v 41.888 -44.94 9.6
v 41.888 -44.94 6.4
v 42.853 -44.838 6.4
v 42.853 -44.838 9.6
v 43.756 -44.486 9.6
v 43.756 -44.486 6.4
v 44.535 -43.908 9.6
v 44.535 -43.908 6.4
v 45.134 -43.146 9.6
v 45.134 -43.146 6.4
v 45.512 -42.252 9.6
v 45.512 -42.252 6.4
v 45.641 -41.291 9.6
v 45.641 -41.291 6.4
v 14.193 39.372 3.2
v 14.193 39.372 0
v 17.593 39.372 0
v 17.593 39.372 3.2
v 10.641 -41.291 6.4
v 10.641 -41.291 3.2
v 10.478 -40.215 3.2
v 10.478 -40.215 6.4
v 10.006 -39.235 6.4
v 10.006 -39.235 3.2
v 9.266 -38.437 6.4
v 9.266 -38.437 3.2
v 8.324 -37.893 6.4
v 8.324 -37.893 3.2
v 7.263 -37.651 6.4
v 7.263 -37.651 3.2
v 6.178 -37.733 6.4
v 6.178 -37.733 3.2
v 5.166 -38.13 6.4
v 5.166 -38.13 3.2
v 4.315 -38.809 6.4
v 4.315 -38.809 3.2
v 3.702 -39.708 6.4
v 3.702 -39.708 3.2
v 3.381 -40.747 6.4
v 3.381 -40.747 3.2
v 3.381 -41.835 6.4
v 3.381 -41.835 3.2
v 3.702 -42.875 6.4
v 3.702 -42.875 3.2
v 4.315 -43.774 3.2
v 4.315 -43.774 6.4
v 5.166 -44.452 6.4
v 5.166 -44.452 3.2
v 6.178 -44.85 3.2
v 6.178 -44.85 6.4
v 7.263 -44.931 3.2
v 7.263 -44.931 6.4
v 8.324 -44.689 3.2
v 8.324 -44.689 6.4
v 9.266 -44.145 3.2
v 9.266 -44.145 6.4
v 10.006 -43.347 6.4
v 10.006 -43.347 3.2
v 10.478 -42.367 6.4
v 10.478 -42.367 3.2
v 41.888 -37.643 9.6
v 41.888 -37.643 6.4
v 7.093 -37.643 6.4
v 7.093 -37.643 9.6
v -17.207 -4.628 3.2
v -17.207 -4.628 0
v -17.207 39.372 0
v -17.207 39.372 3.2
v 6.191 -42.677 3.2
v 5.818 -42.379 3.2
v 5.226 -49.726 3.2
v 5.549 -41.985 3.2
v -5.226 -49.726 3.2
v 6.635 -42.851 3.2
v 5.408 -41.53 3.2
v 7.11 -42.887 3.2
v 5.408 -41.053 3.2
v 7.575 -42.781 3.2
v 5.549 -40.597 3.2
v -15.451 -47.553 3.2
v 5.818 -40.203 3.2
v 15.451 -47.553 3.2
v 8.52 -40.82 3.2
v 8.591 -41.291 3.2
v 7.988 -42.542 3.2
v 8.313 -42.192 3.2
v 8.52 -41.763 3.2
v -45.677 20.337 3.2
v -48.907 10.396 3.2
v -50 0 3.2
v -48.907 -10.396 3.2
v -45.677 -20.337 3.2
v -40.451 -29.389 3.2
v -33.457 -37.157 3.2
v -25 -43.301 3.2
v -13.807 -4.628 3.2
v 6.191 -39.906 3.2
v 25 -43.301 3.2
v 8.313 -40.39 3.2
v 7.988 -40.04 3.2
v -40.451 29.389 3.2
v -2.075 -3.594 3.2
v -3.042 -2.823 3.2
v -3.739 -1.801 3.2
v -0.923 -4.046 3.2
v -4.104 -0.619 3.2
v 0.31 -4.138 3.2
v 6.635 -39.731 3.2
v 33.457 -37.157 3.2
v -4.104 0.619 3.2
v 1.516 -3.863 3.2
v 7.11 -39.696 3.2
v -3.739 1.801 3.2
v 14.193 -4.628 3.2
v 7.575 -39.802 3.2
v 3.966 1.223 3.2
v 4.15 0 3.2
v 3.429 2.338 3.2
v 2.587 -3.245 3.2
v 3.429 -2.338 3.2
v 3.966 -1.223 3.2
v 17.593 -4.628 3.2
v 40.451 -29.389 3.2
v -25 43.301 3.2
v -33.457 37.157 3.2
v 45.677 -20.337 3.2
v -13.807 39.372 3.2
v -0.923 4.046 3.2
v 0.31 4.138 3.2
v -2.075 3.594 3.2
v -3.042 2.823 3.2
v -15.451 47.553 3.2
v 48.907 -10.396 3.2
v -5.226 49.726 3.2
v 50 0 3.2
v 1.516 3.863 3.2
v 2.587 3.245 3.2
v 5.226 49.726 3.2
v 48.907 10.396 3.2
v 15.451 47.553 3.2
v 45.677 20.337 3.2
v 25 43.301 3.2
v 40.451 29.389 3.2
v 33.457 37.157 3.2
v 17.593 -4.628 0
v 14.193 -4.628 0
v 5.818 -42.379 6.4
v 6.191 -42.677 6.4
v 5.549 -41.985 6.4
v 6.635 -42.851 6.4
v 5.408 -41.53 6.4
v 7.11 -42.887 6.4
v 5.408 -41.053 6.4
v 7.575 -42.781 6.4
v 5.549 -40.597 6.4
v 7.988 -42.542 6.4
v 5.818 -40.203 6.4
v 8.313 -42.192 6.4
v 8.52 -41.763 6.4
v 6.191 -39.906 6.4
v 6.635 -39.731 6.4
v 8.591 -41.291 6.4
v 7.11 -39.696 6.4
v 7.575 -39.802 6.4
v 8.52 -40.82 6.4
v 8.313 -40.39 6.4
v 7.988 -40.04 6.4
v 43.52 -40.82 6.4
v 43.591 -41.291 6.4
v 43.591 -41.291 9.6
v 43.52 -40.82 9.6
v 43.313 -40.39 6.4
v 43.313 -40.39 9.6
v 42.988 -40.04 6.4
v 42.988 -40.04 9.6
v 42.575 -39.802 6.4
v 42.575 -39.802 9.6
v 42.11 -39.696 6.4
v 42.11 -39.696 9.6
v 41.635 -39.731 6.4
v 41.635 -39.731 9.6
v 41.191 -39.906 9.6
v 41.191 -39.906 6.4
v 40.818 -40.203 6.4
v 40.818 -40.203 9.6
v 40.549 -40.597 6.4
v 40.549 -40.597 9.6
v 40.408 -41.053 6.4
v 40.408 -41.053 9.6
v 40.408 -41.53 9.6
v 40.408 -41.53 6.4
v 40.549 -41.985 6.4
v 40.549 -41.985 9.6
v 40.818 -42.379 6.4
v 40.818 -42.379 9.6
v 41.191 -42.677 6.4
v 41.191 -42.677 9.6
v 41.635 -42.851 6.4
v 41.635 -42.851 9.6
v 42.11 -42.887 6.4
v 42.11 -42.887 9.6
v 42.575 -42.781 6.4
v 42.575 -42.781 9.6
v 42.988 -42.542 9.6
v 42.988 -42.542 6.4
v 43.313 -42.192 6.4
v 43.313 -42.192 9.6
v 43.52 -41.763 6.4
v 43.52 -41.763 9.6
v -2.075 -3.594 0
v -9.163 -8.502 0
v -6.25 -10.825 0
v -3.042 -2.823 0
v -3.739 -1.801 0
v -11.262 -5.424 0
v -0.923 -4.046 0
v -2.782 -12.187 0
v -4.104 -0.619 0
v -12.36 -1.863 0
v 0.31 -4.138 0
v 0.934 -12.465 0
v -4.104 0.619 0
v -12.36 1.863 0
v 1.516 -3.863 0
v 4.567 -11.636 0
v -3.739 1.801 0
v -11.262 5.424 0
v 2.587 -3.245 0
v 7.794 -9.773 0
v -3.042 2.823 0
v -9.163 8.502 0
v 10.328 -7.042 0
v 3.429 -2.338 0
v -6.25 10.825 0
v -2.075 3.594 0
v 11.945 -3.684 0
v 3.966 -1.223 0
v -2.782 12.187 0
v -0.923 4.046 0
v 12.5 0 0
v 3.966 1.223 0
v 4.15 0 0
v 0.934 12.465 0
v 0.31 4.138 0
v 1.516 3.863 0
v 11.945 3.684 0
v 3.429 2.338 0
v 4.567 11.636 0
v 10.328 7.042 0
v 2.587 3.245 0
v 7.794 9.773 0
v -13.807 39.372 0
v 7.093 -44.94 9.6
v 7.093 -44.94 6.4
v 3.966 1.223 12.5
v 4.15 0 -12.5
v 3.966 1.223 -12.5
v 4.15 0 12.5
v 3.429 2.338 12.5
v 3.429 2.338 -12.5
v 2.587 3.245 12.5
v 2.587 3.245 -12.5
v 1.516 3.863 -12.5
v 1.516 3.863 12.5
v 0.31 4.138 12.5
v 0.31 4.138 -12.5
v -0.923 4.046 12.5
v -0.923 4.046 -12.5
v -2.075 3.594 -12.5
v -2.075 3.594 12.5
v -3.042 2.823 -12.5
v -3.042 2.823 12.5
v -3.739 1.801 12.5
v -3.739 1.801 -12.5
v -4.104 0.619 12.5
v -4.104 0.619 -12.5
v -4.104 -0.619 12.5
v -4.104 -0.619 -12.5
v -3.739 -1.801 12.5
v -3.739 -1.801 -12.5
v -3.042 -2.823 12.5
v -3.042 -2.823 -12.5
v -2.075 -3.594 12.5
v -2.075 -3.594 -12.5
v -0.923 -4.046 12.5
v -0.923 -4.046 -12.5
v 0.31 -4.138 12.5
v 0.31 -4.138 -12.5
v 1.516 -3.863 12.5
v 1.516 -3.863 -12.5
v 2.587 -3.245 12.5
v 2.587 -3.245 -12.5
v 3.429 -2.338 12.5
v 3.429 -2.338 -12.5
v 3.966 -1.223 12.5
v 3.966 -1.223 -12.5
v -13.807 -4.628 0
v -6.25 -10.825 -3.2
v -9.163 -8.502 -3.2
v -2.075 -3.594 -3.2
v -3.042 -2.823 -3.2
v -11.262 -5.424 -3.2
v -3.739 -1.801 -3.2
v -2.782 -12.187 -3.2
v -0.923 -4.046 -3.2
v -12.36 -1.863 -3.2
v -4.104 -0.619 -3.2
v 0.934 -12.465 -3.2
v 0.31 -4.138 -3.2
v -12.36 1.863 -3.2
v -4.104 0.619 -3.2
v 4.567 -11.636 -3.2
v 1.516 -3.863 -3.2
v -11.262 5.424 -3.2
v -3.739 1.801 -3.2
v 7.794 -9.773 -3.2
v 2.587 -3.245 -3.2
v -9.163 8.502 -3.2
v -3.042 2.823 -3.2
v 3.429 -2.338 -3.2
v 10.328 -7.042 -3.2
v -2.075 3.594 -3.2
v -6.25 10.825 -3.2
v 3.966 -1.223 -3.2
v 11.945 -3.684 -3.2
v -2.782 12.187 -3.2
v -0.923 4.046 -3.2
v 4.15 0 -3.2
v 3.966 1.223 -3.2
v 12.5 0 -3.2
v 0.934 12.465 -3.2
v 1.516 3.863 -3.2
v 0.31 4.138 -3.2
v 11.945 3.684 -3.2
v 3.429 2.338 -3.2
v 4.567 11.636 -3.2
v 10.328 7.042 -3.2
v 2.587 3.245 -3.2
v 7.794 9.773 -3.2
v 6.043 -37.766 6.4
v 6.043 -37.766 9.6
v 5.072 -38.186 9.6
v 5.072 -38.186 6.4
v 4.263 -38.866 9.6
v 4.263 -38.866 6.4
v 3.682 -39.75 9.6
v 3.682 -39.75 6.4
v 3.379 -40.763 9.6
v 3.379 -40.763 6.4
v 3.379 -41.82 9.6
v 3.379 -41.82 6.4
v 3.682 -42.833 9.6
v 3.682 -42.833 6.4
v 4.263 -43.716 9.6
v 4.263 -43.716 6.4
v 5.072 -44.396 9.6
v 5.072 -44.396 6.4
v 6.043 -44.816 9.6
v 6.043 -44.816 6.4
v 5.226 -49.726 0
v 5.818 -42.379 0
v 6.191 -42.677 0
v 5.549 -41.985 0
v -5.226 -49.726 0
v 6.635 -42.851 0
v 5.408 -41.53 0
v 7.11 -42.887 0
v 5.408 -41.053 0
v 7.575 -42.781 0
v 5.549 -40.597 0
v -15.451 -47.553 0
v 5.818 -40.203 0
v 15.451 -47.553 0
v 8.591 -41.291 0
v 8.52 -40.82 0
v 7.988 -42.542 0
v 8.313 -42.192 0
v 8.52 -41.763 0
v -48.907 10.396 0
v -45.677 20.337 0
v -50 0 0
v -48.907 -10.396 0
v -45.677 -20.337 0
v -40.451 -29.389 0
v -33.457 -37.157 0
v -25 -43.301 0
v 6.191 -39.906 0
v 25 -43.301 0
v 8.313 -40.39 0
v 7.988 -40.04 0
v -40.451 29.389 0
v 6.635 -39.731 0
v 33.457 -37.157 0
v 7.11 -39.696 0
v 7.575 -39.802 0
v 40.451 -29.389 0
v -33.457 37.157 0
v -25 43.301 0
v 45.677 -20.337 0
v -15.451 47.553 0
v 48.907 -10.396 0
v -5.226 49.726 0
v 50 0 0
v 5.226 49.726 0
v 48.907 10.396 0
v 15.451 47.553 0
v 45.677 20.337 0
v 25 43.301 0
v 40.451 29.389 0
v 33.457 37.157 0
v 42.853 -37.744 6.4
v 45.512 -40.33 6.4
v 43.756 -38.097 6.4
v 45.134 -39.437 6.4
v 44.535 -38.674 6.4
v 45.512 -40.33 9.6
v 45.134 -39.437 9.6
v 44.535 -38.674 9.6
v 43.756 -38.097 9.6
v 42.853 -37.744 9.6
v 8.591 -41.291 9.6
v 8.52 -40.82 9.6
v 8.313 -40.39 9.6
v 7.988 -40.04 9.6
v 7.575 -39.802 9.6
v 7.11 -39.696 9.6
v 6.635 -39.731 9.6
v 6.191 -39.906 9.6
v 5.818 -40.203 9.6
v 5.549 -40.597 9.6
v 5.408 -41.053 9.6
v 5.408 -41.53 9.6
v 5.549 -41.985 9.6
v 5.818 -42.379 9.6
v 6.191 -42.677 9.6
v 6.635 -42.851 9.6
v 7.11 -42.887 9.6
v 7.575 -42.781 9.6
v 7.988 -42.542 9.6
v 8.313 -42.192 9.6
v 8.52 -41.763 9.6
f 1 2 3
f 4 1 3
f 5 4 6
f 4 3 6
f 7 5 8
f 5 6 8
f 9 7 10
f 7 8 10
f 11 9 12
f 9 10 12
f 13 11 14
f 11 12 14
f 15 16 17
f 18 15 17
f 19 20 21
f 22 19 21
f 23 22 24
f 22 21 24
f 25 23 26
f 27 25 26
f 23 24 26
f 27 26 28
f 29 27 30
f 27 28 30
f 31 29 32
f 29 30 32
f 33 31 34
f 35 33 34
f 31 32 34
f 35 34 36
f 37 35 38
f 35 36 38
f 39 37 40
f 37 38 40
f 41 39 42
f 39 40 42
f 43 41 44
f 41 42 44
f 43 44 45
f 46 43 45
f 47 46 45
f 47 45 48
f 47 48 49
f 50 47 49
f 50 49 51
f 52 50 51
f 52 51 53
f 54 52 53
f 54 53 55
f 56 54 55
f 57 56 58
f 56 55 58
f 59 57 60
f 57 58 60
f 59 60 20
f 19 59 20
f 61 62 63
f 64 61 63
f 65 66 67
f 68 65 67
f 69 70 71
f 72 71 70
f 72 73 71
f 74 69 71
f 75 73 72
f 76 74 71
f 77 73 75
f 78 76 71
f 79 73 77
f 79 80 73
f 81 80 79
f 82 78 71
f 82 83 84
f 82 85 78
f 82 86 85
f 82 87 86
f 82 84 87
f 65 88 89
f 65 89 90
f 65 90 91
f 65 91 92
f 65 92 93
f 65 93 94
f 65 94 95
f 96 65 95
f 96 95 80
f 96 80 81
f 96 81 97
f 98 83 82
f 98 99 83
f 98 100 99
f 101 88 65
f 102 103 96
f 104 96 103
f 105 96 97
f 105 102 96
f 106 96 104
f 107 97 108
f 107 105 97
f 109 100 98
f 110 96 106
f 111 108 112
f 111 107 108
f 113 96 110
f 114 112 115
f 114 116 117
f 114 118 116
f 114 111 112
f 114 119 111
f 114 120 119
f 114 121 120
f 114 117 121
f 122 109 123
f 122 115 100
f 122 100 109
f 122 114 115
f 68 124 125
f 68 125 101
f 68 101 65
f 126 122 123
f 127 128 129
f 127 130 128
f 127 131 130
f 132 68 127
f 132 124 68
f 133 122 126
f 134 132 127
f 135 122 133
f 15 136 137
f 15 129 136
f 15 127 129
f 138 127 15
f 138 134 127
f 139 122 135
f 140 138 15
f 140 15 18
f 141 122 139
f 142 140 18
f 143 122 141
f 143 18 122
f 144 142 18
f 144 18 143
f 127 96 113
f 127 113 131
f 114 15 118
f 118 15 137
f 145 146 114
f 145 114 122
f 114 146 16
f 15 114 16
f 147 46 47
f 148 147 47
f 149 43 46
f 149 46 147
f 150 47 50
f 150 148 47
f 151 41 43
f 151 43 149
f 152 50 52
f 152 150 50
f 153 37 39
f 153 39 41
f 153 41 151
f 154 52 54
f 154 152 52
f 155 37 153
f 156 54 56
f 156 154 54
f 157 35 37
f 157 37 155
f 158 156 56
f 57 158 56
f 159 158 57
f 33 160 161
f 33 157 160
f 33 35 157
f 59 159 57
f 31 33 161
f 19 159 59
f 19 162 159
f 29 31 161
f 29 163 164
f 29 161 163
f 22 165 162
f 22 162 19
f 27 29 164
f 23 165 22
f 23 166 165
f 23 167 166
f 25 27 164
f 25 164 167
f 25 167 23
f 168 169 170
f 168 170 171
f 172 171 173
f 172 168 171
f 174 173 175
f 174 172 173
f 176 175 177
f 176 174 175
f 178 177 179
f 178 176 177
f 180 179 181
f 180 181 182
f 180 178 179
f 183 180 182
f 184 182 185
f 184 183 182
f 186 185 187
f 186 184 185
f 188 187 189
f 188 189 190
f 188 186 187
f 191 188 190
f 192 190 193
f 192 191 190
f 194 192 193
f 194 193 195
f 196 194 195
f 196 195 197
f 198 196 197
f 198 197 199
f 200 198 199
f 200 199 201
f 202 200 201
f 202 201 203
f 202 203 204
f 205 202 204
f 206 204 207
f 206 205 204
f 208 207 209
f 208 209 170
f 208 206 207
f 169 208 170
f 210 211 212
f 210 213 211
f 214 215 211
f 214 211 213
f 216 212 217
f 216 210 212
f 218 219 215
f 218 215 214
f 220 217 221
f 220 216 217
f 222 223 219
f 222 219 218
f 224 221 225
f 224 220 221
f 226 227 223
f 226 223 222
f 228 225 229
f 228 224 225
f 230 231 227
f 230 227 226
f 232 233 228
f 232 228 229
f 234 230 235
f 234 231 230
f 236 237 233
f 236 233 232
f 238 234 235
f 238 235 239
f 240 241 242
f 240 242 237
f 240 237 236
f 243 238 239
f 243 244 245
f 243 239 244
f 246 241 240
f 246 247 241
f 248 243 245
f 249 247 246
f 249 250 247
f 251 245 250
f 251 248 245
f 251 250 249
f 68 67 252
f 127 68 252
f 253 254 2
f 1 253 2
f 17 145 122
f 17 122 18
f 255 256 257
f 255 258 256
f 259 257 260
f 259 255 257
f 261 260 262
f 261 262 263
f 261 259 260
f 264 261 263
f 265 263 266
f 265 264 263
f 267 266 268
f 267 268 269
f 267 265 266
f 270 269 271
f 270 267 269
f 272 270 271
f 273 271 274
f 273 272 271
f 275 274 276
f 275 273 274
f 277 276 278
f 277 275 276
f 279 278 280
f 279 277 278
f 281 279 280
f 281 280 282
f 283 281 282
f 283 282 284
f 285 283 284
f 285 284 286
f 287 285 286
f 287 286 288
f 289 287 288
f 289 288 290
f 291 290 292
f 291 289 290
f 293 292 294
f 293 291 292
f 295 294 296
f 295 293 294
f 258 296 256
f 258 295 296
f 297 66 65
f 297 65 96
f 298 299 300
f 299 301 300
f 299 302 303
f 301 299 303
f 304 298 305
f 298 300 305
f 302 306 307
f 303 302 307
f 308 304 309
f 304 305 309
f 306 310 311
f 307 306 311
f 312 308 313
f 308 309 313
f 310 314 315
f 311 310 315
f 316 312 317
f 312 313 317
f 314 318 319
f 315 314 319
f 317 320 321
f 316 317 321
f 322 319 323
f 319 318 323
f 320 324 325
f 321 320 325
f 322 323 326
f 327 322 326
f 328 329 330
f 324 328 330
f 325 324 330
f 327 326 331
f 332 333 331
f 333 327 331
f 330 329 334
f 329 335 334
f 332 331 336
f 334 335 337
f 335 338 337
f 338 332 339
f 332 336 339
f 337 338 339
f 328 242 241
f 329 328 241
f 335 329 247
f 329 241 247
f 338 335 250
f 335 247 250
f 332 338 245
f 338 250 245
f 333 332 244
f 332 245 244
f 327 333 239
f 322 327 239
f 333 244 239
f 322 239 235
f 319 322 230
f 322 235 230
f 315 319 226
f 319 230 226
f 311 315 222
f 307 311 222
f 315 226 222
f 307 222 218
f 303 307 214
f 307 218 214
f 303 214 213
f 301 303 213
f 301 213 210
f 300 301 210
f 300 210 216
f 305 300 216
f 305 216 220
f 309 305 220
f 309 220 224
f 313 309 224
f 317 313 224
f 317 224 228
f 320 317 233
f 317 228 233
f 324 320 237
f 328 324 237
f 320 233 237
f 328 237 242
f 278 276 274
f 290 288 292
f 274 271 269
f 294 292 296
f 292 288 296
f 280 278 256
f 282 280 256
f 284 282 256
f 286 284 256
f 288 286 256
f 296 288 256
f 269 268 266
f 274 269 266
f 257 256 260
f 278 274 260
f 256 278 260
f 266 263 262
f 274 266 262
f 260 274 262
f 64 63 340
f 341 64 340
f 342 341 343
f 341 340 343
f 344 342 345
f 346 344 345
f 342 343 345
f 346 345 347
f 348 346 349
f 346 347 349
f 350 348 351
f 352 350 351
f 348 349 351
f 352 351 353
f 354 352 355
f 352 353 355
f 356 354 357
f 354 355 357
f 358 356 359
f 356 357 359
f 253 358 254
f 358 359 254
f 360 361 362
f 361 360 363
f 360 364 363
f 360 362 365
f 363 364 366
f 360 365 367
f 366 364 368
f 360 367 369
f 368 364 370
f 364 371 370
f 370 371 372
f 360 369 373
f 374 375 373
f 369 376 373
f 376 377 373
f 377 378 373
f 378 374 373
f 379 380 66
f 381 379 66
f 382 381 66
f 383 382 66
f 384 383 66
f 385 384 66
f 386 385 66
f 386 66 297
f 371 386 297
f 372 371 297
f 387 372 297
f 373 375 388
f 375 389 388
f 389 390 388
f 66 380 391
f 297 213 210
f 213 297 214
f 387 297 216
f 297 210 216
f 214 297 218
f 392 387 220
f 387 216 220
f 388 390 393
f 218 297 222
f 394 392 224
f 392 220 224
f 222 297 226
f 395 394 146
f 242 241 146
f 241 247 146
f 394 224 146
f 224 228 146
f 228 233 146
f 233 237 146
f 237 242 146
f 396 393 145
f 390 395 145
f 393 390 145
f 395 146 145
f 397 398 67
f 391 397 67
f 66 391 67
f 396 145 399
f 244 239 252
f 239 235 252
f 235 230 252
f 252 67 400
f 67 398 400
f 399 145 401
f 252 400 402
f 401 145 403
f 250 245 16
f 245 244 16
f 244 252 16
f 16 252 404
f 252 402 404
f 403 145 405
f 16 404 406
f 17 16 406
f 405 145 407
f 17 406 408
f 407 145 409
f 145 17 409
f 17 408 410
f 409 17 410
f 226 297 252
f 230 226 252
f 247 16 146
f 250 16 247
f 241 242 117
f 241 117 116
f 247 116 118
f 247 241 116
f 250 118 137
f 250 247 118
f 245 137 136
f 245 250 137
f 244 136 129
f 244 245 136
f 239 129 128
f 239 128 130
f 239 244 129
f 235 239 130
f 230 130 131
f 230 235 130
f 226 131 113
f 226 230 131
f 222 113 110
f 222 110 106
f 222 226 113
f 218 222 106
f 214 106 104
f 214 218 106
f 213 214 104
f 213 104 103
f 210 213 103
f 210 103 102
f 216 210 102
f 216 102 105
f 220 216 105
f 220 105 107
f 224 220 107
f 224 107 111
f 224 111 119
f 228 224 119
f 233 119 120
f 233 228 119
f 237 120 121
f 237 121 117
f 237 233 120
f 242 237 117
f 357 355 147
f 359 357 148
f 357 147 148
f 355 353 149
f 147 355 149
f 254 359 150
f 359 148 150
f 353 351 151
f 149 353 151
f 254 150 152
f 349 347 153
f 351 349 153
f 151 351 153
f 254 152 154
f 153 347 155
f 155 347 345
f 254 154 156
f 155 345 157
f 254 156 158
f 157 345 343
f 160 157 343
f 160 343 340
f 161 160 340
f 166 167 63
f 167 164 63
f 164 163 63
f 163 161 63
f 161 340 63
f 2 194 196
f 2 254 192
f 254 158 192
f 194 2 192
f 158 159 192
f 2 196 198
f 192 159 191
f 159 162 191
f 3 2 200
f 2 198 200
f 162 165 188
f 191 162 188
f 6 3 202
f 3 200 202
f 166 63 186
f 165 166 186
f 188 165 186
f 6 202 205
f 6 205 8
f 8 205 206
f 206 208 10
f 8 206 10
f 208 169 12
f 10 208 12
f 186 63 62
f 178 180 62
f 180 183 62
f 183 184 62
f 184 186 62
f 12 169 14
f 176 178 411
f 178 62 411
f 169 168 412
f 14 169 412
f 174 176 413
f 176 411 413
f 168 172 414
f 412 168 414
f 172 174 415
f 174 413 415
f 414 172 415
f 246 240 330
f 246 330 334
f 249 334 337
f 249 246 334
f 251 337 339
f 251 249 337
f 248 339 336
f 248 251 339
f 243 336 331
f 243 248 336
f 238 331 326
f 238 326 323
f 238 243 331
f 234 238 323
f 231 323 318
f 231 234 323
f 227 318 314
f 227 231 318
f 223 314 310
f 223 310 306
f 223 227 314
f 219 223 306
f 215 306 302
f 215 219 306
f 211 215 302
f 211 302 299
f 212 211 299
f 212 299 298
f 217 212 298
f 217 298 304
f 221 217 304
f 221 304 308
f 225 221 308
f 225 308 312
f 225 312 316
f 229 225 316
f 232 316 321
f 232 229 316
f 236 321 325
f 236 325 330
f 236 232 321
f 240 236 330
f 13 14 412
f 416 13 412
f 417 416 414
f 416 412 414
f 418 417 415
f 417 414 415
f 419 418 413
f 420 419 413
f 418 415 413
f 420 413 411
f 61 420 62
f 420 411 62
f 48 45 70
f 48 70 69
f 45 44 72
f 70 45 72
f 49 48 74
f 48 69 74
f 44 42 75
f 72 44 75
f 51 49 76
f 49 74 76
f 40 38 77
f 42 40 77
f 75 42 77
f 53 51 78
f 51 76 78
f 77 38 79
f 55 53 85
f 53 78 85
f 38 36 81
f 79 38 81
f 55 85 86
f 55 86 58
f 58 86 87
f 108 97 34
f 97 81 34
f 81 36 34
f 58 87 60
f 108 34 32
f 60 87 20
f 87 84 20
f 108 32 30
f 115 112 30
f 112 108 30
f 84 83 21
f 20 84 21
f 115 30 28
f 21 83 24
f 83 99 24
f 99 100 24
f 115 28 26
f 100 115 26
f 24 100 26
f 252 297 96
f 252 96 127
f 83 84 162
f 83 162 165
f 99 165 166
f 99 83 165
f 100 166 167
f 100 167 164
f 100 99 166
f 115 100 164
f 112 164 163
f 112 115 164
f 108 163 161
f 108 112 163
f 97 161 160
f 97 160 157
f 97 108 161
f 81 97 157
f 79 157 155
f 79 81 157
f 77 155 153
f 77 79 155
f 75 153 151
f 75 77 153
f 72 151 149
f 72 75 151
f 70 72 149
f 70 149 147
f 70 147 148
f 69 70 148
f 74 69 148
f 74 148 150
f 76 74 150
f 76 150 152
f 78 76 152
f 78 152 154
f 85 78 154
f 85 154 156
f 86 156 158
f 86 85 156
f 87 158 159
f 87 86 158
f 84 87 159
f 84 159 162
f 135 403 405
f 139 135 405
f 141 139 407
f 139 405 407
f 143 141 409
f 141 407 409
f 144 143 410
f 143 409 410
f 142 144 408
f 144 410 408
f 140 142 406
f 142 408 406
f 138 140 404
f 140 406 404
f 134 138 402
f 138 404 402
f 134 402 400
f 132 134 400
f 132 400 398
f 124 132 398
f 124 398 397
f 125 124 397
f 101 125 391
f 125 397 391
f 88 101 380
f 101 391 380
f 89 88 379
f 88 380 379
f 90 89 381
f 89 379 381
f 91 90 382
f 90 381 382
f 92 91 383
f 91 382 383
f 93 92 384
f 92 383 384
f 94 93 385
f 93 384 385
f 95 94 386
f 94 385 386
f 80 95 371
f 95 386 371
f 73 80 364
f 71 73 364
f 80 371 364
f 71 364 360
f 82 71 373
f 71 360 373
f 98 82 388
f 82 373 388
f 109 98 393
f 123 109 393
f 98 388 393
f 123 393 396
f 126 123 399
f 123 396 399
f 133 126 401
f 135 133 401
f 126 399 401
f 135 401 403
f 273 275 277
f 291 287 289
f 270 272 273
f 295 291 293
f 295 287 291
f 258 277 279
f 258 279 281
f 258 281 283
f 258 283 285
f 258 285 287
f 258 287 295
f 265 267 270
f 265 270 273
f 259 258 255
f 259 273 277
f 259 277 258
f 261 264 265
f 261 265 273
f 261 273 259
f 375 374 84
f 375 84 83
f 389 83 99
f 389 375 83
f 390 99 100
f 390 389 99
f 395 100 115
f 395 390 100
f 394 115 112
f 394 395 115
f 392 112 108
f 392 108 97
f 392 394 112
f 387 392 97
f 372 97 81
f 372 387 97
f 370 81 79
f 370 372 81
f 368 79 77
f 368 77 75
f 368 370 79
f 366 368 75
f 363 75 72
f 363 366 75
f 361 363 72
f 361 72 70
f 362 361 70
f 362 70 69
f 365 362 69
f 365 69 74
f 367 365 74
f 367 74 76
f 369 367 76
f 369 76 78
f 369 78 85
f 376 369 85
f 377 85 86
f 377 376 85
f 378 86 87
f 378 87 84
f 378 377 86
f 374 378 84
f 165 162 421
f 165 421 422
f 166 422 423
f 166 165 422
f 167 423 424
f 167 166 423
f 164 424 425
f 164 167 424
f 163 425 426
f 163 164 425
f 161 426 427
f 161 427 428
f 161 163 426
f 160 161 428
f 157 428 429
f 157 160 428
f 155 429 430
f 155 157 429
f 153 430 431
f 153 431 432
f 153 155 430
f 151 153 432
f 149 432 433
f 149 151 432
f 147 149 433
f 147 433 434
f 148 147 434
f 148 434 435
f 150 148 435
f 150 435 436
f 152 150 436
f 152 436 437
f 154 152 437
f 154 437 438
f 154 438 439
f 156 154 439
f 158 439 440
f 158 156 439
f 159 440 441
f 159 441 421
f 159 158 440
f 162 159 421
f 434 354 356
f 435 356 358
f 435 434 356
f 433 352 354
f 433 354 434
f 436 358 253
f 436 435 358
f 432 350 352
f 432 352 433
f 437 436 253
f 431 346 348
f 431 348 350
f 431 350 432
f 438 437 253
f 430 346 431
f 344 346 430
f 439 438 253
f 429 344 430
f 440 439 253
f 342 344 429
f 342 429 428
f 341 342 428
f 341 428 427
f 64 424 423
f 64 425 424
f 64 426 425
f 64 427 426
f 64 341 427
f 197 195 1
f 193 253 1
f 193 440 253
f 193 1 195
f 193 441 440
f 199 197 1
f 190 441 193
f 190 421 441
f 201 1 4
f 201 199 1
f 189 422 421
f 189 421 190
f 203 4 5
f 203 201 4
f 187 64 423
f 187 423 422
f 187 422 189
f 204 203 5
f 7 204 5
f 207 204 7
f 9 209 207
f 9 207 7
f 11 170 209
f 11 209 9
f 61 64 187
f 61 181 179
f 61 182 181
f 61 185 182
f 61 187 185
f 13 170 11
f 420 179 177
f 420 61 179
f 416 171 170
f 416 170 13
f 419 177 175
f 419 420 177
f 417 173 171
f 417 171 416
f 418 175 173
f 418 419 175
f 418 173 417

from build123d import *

# Parameters (mm, degrees)
F0_R     = 50
F0_R_2   = 1.6
F0_W     = 3.4
F0_H     = 44
F0_R_3   = 4.15
F1_DEPTH = 3.2
F2_R     = 12.5
F2_R_2   = 4.15
F3_DEPTH = 3.2
F4_DEPTH = 12.5
F5_R     = 3.65
F5_R_2   = 1.6
F6_DEPTH = 3.2
F7_R     = 1.6
F8_DEPTH = 3.2


with BuildPart() as f1:
    # F0 (on Top) → F1 (new body)
    with BuildSketch(Plane.XY):
        Circle(F0_R)
        with Locations((6.9906120189, -41.291178298)):
            Circle(F0_R_2, mode=Mode.SUBTRACT)
        with Locations((-15.506935212, 17.3723615035)):
            Rectangle(F0_W, F0_H, mode=Mode.SUBTRACT)
        Circle(F0_R_3, mode=Mode.SUBTRACT)
        with Locations((15.893064788, 17.3723615035)):
            Rectangle(F0_W, F0_H, mode=Mode.SUBTRACT)
    extrude(amount=F1_DEPTH)


with BuildPart() as f3:
    # F2 (on face) → F3 (new body)
    with BuildSketch(Plane.XY):
        Circle(F2_R)
        Circle(F2_R_2, mode=Mode.SUBTRACT)
    extrude(amount=-F3_DEPTH)


with BuildPart() as f4:
    # F0 (on Top) → F4 (new body, symmetric)
    with BuildSketch(Plane.XY):
        Circle(F0_R_3)
    extrude(amount=F4_DEPTH, both=True)


with BuildPart() as f6:
    # F5 (on face) → F6 (new body)
    with BuildSketch(Plane.XY.offset(3.2)):
        with Locations((6.9906120189, -41.291178298)):
            Circle(F5_R)
        with Locations((6.9906120189, -41.291178298)):
            Circle(F5_R_2, mode=Mode.SUBTRACT)
    extrude(amount=F6_DEPTH)


with BuildPart() as f8:
    # F7 (on face) → F8 (new body)
    with BuildSketch(Plane.XY.offset(6.4)):
        with BuildLine():
            ThreePointArc((10.6406120189, -41.291178298), (9.607413989, -43.8357504524), (7.0927504029, -44.9397489429))
            Line((7.0927504029, -44.9397489429), (41.8884736348, -44.9397489429))
            ThreePointArc((41.8884736348, -44.9397489429), (38.3406120189, -41.291178298), (41.8884736348, -37.6426076531))
            Line((41.8884736348, -37.6426076531), (7.0927504029, -37.6426076531))
            ThreePointArc((7.0927504029, -37.6426076531), (9.607413989, -38.7466061436), (10.6406120189, -41.291178298))
        make_face()
        with BuildLine():
            ThreePointArc((7.0927504029, -37.6426076531), (3.3406120189, -41.291178298), (7.0927504029, -44.9397489429))
            ThreePointArc((7.0927504029, -44.9397489429), (9.607413989, -43.8357504524), (10.6406120189, -41.291178298))
            ThreePointArc((10.6406120189, -41.291178298), (9.607413989, -38.7466061436), (7.0927504029, -37.6426076531))
        make_face()
        with Locations((6.9906120189, -41.291178298)):
            Circle(F7_R, mode=Mode.SUBTRACT)
        with BuildLine():
            ThreePointArc((41.8884736348, -37.6426076531), (38.3406120189, -41.291178298), (41.8884736348, -44.9397489429))
            ThreePointArc((41.8884736348, -44.9397489429), (44.5351841733, -43.9079802681), (45.6406120189, -41.291178298))
            ThreePointArc((45.6406120189, -41.291178298), (44.5351841733, -38.6743763279), (41.8884736348, -37.6426076531))
        make_face()
        with Locations((41.9906120189, -41.291178298)):
            Circle(F7_R, mode=Mode.SUBTRACT)
    extrude(amount=F8_DEPTH)


solid = Compound([f1.part, f3.part, f4.part, f6.part, f8.part])
